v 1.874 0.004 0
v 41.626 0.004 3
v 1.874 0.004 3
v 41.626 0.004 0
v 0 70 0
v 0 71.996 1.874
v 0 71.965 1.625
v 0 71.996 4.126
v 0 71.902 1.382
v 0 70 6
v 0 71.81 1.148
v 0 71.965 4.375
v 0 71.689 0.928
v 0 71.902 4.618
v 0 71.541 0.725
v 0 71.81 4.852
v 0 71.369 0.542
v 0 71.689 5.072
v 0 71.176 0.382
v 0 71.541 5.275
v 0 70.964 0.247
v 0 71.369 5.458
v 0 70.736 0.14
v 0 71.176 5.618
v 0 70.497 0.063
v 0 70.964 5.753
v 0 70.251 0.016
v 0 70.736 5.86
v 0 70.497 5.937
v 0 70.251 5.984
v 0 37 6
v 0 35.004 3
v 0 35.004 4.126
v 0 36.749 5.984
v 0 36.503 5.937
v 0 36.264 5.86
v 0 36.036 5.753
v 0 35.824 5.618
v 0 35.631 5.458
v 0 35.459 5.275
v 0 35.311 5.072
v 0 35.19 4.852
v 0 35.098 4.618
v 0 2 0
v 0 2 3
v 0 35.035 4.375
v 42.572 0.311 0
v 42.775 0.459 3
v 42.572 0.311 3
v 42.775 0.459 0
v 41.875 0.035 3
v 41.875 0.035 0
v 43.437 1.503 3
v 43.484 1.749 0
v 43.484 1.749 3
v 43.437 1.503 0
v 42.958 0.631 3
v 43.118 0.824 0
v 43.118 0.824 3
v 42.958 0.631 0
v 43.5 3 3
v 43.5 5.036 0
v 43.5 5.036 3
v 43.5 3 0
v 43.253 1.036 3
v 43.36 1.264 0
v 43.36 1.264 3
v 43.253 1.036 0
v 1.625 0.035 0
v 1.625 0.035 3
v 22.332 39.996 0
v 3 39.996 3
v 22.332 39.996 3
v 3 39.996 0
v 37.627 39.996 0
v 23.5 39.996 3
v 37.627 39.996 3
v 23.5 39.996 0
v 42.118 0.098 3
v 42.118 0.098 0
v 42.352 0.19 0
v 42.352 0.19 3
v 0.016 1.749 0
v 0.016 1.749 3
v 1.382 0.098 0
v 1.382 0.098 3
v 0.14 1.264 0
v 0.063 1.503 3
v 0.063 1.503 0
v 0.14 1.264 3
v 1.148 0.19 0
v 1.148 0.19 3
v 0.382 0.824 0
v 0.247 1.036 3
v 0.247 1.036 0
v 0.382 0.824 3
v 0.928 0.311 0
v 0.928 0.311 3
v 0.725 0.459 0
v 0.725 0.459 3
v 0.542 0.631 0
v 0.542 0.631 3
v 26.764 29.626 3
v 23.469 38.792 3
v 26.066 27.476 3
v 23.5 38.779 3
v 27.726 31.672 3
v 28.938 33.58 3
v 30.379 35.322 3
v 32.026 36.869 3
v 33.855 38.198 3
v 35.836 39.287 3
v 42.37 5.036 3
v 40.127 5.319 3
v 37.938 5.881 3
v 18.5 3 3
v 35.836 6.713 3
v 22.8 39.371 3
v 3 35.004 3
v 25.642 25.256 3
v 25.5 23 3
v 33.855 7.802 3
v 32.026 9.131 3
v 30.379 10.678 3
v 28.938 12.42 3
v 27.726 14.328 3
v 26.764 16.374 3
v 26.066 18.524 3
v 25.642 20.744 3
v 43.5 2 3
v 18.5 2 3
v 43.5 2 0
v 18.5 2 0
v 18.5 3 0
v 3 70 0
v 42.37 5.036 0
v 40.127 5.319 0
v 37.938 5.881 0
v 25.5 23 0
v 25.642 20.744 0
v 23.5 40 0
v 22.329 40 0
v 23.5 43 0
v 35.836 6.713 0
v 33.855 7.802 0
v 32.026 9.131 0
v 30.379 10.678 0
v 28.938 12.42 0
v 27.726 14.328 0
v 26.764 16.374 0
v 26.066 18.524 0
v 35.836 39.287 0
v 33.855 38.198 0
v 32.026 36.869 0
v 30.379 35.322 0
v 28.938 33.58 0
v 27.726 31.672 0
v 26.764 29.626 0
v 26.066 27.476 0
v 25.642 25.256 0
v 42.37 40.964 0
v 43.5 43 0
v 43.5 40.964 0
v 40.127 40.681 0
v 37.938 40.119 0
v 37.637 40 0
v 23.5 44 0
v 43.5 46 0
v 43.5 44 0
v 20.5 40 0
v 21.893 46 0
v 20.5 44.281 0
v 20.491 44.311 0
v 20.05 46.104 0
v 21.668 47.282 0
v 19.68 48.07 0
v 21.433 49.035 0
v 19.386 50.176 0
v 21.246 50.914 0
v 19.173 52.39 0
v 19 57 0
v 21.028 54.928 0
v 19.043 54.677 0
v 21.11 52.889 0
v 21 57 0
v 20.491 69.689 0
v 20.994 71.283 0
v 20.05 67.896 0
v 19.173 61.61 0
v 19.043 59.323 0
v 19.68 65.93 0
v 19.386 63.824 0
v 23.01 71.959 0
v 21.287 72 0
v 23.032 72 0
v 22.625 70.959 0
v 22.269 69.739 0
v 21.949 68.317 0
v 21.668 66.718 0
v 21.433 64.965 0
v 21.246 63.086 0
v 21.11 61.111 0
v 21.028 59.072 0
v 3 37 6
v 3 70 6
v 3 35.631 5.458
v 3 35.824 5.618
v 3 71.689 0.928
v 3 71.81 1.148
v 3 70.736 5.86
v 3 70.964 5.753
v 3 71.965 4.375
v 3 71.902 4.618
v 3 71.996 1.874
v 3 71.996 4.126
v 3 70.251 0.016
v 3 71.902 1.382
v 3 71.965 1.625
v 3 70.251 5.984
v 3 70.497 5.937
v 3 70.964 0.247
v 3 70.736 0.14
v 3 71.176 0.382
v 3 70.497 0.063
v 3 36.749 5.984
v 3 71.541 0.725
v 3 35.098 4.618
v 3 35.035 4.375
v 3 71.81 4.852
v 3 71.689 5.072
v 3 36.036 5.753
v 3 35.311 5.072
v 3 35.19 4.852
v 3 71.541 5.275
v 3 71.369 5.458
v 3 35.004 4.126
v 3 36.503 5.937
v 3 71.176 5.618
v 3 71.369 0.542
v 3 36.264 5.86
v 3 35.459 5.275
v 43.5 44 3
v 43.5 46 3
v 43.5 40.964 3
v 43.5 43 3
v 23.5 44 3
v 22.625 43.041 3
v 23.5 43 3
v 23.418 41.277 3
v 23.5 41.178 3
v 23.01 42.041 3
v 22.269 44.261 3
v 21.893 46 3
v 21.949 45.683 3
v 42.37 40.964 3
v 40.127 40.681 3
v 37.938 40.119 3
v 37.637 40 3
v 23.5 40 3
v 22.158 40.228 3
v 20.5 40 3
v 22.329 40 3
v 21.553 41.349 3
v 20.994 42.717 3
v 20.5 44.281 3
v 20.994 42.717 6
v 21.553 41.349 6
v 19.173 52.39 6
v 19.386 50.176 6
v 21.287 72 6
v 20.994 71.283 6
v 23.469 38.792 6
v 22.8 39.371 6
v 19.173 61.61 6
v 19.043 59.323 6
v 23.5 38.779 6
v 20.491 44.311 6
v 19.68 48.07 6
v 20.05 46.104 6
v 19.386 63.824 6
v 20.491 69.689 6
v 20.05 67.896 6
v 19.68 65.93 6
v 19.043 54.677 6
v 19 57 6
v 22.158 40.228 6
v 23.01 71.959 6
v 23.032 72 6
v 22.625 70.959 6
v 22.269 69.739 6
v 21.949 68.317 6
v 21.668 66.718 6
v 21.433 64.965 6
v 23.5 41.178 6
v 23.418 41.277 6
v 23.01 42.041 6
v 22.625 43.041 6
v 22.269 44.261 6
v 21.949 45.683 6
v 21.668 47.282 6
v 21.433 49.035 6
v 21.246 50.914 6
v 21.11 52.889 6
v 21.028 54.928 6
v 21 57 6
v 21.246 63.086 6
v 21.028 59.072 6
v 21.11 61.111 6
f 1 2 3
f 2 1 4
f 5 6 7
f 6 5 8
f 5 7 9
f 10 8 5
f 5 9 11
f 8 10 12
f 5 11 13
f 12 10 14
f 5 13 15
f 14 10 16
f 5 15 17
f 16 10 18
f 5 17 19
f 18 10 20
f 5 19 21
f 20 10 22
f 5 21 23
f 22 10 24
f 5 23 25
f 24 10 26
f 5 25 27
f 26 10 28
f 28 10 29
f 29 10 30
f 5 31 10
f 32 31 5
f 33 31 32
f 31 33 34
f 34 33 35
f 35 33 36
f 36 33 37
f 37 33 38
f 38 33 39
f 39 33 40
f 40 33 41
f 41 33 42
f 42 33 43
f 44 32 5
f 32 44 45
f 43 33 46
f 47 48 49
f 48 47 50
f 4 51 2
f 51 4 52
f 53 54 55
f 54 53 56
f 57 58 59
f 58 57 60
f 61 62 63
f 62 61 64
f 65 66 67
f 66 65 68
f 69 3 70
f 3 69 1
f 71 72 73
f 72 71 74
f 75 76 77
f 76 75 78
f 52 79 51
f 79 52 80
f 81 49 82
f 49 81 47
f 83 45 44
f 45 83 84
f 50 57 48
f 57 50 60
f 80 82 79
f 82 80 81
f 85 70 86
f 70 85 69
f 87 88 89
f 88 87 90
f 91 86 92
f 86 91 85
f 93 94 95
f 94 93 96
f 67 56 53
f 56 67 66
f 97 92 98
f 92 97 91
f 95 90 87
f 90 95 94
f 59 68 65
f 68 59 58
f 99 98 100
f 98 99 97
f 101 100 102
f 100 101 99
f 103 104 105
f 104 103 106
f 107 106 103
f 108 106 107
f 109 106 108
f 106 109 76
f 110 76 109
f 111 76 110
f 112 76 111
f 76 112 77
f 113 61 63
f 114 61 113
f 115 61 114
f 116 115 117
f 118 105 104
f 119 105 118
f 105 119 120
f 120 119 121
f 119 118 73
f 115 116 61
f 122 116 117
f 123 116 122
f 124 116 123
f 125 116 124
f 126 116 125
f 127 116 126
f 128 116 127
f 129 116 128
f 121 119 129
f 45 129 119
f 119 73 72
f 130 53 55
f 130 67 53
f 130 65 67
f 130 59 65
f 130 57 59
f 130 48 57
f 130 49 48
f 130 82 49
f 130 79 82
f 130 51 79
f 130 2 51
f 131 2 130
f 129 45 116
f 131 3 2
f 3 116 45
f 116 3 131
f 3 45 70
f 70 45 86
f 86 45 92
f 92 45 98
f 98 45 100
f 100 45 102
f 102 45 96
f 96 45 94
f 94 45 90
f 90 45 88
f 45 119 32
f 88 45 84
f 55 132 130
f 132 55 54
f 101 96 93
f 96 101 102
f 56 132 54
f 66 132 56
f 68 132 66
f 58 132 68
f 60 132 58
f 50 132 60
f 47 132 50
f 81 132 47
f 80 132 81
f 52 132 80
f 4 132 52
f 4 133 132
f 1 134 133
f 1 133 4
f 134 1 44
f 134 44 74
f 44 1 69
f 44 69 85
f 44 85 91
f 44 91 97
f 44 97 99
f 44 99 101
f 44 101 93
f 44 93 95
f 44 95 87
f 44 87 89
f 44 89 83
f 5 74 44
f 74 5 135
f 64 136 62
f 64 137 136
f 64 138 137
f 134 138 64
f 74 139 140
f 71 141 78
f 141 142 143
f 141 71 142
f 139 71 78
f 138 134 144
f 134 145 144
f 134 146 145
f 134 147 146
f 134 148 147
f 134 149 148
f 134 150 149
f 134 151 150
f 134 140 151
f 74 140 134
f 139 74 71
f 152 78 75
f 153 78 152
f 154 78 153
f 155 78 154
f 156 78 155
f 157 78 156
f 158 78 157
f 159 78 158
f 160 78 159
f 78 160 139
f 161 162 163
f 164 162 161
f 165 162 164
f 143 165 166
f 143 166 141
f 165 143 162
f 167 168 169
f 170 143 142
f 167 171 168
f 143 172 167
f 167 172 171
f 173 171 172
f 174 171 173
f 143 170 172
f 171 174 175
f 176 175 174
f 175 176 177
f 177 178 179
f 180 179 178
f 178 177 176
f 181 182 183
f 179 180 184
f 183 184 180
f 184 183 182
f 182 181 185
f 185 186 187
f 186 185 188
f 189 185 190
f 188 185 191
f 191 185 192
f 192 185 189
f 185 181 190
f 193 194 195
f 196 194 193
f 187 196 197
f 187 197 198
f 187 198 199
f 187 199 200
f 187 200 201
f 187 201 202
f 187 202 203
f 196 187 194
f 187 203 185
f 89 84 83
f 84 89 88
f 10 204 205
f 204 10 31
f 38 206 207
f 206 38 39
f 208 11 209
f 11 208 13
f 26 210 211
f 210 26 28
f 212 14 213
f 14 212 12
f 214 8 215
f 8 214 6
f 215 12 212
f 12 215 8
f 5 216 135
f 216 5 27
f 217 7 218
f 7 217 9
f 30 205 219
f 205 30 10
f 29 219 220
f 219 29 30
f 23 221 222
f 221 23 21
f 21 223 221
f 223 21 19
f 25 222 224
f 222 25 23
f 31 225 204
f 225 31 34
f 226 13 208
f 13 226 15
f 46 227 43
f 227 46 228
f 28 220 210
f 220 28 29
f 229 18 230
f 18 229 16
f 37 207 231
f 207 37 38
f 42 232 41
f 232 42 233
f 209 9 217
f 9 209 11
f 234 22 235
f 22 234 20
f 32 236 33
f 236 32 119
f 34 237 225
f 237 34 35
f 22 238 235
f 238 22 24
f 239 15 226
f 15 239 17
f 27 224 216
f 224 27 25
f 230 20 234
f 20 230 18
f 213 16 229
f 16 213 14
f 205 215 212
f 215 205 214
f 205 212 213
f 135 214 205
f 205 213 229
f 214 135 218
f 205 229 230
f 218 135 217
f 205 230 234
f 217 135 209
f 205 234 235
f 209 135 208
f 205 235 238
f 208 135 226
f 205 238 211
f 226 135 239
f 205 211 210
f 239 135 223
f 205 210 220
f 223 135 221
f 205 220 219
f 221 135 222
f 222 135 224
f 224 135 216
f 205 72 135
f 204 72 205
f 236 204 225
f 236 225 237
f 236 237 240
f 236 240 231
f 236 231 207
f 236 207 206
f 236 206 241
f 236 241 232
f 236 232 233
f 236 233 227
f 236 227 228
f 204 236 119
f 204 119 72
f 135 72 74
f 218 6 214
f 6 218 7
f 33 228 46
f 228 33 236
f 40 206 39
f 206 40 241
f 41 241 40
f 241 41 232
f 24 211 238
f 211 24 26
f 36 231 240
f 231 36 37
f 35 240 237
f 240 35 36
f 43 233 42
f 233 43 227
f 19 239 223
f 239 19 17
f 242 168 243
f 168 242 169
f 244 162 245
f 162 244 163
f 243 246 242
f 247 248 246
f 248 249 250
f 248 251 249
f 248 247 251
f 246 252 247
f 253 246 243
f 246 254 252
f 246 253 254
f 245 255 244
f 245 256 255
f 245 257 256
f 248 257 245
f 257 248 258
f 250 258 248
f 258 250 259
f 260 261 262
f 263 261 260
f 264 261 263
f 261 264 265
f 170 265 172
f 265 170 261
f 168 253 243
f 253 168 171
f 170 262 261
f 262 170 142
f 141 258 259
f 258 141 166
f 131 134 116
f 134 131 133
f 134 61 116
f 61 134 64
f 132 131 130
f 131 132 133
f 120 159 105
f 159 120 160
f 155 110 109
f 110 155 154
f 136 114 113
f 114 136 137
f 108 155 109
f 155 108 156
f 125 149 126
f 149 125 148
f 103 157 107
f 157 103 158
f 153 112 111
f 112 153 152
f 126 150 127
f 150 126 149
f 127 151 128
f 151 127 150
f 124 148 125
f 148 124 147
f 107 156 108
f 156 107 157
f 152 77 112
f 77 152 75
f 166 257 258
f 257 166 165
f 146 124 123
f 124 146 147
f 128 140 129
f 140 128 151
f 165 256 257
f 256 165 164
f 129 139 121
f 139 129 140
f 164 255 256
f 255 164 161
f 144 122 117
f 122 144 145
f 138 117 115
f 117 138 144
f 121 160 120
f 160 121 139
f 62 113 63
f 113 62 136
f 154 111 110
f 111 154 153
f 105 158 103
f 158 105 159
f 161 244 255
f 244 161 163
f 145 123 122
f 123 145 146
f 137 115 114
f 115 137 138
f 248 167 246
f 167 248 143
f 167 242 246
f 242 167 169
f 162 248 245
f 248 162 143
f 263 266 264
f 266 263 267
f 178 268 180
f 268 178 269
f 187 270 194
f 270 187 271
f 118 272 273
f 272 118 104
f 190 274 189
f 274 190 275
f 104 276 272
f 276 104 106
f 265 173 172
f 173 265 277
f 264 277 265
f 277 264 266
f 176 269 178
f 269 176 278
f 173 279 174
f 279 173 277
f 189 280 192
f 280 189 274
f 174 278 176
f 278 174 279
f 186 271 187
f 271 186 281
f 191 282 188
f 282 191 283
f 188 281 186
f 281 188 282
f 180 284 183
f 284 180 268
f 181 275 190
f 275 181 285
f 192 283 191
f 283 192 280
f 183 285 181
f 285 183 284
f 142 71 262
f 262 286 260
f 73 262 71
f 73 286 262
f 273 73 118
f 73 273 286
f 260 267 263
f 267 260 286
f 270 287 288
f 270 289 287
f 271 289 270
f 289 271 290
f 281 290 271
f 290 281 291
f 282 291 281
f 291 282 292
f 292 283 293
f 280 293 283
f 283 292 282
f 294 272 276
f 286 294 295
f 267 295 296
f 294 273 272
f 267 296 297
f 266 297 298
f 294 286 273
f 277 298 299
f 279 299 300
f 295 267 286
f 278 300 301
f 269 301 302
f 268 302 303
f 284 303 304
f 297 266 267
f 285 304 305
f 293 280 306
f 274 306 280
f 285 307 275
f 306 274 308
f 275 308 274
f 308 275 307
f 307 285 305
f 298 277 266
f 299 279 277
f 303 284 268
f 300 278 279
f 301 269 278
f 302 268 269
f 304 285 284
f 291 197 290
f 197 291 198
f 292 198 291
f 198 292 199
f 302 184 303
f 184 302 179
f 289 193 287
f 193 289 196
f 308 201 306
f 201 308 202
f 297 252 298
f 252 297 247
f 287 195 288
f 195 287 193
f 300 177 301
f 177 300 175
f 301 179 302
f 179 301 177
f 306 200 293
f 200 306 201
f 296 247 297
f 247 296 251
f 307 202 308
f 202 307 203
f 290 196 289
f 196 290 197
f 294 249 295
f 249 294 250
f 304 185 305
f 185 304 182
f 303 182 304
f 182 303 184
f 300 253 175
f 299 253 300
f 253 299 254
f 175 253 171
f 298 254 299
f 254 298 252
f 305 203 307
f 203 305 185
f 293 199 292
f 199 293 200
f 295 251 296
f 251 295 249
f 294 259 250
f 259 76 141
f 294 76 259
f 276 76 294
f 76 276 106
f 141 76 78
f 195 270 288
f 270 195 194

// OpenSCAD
//table thickness in mm
table=17.5;

/* [Hidden] */
t=table+1;
$fn=50;

difference() {
	union (){
	translate ([2,2,0]) minkowski(){
		cube([t+21,36,2]);
		cylinder(r=2,h=1);
	}
	translate([0,37,2]) minkowski(){
		cube([2,33,2]);
		rotate([0,90,0]) cylinder(r=2,h=1);
	}
		
	translate([t+2,40,0]) cube([23,6,3]);
	}
	translate([t,2,-1])cube([31,1,5]);
	translate([t+25,23,-1])cylinder(r=18,h=5);
	translate([t+5,43,-1])cube([30,1,5]);
}

difference() {
	translate([t+6,57,0]) resize([11,37,6])cylinder(r=10,h=6);
	translate ([t+6,57,-1])resize([7,33,8]) cylinder(r=10,h=6);
	translate ([t+5,35,-1])cube([20,45,8]);
	translate ([t-1,72,-1])cube([20,45,8]);
}
